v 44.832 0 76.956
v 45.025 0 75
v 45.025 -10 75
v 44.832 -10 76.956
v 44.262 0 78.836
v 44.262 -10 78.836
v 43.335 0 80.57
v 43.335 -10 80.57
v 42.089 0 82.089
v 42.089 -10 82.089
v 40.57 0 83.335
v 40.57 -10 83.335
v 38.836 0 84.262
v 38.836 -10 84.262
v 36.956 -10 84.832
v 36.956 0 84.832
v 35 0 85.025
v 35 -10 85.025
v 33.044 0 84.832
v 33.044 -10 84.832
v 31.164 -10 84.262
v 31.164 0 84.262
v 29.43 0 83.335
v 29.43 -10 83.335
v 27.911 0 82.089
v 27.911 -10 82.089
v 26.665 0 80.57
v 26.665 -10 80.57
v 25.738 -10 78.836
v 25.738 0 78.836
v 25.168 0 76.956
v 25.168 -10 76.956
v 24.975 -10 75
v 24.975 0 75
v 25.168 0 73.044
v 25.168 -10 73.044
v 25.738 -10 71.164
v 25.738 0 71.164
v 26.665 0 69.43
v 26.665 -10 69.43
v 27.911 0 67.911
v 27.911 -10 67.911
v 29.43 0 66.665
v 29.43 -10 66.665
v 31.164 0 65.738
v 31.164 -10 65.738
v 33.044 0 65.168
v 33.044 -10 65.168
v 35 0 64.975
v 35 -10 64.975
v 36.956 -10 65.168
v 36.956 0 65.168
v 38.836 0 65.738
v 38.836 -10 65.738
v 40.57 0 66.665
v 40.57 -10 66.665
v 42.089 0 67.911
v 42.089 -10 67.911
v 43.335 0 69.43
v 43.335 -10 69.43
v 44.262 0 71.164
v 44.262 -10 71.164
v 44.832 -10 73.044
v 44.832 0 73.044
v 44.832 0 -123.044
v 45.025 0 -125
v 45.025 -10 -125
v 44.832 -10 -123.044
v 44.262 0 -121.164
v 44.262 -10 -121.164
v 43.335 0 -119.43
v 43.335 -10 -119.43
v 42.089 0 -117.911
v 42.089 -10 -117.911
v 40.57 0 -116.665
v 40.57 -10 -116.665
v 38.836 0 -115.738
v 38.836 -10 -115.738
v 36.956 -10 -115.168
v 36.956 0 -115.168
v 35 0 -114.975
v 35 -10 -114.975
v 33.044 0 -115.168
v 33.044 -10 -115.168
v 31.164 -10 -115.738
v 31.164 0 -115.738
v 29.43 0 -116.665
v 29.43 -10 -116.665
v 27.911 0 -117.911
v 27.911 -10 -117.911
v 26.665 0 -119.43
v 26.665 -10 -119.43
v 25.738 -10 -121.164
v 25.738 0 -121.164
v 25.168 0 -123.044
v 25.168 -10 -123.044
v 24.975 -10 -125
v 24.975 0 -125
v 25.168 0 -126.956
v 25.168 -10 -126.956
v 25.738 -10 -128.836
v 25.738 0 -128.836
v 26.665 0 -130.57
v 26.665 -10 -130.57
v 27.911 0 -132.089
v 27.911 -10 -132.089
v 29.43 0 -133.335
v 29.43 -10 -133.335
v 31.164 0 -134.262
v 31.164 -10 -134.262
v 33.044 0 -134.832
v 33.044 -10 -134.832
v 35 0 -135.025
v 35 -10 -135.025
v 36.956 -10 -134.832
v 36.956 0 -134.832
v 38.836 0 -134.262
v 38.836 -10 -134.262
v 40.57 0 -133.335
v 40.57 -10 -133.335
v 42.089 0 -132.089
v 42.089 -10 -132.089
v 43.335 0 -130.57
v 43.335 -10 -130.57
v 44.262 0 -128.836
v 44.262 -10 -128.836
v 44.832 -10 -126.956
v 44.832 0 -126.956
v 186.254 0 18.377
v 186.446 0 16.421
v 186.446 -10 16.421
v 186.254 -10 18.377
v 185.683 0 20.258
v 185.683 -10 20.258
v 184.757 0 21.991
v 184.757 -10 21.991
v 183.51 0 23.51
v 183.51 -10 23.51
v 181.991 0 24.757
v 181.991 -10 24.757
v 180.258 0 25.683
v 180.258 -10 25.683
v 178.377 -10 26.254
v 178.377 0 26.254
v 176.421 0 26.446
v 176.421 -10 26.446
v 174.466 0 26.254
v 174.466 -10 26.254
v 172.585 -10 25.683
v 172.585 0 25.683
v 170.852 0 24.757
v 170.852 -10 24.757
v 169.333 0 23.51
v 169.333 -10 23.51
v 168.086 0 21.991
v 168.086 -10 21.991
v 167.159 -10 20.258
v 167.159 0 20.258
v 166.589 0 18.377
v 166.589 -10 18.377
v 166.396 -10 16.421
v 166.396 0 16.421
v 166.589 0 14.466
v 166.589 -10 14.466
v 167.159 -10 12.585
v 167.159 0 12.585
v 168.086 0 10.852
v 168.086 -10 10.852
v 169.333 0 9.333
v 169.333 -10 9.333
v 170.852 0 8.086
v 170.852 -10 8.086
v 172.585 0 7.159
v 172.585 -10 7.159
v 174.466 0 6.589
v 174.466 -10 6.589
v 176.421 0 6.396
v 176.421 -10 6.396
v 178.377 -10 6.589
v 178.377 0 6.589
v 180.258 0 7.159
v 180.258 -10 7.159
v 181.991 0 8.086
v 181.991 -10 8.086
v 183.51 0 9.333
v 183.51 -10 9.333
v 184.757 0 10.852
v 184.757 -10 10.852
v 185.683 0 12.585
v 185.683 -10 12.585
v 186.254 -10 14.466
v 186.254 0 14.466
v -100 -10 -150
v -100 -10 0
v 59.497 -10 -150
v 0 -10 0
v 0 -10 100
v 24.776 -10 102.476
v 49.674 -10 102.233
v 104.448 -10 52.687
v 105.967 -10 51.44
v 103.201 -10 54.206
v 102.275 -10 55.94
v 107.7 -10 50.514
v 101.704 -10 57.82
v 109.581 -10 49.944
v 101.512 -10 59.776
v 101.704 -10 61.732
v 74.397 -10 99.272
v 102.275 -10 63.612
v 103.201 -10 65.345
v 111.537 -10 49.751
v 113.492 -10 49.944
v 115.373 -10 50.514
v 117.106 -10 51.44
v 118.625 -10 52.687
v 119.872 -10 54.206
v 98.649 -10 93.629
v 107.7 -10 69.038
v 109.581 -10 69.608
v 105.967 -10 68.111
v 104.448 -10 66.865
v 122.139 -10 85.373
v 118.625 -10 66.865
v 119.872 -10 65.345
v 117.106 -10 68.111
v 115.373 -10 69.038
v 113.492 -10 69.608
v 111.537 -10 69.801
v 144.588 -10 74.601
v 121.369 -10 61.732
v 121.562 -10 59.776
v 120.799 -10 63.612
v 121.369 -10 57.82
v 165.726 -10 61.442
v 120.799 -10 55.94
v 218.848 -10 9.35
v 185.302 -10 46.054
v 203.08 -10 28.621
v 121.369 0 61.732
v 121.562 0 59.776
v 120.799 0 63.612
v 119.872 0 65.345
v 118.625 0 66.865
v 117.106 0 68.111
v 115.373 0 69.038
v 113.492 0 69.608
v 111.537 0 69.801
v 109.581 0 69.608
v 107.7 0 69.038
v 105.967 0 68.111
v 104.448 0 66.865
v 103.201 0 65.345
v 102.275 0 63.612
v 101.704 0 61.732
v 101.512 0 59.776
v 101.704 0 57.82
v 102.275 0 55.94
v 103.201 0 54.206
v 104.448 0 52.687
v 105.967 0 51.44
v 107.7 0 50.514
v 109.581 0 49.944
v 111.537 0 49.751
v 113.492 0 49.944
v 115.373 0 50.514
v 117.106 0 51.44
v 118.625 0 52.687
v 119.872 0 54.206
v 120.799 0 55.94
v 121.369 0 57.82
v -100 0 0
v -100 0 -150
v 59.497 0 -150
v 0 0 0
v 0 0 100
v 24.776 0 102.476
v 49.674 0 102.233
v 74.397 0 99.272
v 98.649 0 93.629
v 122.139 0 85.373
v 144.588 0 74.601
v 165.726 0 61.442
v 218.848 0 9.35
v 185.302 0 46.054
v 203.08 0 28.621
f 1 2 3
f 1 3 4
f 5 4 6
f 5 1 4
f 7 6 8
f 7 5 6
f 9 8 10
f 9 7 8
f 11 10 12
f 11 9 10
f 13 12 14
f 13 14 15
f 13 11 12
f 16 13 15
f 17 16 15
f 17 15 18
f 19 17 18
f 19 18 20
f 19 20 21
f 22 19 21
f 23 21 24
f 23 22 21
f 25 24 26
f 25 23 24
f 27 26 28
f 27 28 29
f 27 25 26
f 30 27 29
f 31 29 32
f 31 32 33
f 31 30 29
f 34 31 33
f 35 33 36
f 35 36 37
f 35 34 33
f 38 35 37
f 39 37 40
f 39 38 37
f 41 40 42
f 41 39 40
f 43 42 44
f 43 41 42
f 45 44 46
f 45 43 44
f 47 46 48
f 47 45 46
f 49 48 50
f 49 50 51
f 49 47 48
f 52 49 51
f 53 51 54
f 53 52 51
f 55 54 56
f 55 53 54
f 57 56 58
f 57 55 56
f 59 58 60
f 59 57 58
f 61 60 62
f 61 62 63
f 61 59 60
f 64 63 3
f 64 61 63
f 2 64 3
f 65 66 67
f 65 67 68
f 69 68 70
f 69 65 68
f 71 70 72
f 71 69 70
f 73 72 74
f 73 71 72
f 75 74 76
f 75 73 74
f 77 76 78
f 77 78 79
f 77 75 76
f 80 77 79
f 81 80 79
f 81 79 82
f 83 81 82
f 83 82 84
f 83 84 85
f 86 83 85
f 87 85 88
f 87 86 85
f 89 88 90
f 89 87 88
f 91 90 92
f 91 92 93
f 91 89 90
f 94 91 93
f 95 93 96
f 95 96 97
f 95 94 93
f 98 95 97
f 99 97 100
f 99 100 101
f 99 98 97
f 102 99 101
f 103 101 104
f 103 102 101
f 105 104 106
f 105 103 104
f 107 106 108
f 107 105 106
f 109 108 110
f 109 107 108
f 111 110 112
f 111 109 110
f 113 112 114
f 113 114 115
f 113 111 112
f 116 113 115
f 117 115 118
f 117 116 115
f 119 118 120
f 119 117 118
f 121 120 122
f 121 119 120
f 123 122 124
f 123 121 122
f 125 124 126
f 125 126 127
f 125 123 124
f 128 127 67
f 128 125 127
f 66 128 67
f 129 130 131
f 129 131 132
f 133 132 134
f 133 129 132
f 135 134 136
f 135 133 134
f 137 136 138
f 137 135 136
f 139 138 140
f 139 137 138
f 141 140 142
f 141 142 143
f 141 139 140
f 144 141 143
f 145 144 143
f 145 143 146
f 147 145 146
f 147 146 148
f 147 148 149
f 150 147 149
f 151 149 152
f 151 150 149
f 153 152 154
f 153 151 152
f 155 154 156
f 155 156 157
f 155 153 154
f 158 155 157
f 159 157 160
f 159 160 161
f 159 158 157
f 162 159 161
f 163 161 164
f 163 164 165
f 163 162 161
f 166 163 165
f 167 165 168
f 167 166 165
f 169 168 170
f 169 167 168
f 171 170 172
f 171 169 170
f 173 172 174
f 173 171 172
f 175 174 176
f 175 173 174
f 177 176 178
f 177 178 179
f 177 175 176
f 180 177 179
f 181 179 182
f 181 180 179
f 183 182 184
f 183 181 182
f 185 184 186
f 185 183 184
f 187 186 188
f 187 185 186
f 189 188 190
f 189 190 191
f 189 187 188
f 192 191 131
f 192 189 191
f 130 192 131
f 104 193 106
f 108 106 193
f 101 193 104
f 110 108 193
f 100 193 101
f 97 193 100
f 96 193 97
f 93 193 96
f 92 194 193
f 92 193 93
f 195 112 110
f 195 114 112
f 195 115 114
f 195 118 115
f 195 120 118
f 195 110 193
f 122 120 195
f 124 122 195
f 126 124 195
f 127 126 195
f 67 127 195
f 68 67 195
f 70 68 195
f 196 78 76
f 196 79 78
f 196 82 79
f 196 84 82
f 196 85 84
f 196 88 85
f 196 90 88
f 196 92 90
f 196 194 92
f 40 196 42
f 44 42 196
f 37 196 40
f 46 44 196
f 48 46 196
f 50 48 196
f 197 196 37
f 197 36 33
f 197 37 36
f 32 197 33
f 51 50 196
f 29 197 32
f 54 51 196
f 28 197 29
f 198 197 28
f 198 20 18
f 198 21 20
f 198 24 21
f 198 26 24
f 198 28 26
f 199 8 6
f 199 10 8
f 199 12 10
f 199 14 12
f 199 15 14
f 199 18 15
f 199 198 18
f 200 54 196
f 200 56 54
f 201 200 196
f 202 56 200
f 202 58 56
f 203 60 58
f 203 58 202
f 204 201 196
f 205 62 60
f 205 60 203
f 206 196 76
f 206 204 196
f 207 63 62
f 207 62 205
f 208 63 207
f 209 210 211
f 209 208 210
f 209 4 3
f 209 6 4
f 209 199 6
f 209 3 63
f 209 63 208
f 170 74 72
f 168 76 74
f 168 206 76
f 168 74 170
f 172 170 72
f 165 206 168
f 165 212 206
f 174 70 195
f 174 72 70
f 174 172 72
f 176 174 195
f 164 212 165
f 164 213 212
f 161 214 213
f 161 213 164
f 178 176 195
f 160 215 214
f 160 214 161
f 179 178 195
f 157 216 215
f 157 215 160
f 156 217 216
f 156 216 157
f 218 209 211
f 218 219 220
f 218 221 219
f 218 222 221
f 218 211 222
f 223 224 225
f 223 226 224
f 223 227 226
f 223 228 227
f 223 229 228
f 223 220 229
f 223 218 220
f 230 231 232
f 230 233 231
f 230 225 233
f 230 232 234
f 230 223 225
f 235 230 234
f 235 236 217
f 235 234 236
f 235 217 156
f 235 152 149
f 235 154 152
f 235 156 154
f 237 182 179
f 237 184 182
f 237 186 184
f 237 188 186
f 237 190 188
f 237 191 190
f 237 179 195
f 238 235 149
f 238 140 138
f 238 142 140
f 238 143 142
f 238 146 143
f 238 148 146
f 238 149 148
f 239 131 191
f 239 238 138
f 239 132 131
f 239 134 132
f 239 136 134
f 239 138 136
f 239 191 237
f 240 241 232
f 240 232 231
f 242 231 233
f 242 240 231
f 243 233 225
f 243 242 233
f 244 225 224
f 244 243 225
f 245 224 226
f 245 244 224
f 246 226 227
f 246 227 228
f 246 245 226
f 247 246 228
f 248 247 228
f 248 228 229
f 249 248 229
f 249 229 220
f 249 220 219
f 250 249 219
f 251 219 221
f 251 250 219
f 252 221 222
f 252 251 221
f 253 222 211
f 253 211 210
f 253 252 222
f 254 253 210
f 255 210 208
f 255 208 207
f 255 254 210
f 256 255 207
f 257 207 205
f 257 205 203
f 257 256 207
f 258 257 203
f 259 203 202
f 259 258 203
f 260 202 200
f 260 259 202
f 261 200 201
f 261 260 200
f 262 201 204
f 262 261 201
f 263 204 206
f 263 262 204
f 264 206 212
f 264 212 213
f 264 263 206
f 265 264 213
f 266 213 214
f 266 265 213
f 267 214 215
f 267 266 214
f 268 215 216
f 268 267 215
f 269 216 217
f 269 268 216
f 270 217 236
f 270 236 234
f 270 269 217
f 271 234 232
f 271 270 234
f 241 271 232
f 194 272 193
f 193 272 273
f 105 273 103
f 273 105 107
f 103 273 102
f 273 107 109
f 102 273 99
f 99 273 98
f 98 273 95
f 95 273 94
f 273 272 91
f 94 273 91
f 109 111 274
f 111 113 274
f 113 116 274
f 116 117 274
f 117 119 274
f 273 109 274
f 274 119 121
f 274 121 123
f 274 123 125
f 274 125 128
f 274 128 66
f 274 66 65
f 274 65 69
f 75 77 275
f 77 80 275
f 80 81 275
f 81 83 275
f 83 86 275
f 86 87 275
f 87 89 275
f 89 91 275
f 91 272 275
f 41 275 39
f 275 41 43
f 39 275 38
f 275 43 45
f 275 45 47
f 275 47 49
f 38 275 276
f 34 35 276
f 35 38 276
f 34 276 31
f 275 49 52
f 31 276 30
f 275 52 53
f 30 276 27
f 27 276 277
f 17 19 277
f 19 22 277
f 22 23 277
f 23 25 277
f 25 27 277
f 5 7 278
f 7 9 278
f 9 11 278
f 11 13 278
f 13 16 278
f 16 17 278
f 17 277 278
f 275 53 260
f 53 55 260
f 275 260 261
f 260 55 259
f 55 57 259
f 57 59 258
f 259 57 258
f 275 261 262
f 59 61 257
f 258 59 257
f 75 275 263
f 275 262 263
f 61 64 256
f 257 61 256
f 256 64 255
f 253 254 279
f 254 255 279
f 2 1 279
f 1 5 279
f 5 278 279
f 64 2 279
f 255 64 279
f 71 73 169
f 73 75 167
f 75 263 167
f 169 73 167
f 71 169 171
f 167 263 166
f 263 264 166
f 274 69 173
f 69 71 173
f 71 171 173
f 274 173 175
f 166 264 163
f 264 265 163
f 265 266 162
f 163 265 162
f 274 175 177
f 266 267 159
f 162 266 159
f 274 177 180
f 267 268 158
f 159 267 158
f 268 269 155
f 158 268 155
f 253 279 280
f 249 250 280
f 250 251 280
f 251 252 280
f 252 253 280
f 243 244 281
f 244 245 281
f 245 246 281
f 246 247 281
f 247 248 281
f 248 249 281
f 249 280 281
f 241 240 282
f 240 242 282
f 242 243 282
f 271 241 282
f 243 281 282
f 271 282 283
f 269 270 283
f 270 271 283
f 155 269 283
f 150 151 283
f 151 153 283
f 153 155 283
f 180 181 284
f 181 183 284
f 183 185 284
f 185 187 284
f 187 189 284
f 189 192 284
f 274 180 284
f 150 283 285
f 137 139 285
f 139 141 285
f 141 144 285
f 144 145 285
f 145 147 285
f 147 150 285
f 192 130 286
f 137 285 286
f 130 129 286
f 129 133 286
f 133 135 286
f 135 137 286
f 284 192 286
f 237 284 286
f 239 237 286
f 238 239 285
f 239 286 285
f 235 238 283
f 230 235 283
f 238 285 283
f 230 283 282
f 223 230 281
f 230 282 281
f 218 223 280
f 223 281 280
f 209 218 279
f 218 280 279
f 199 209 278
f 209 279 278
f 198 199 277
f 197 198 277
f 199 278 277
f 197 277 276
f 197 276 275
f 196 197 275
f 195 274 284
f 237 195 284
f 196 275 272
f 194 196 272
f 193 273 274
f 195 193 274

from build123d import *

# Parameters (mm, degrees)
F0_R     = 10.025
F1_DEPTH = 10


with BuildPart() as f1:
    # F0 (on Front) → F1 (new body)
    with BuildSketch(Plane.XZ):
        with BuildLine():
            Line((0, 100), (0, 0))
            Line((0, 0), (-100, 0))
            Line((-100, 0), (-100, -150))
            Line((-100, -150), (59.497475, -150))
            Line((59.497475, -150), (218.847763, 9.350288))
            ThreePointArc((218.847763, 9.350288), (122.139295, 85.372867), (0, 100))
        make_face()
        with Locations((35, -125)):
            Circle(F0_R, mode=Mode.SUBTRACT)
        with Locations((35, 75)):
            Circle(F0_R, mode=Mode.SUBTRACT)
        with Locations((176.421356, 16.421356)):
            Circle(F0_R, mode=Mode.SUBTRACT)
        with Locations((111.536686, 59.775907)):
            Circle(F0_R, mode=Mode.SUBTRACT)
    extrude(amount=F1_DEPTH)


solid = f1.part
